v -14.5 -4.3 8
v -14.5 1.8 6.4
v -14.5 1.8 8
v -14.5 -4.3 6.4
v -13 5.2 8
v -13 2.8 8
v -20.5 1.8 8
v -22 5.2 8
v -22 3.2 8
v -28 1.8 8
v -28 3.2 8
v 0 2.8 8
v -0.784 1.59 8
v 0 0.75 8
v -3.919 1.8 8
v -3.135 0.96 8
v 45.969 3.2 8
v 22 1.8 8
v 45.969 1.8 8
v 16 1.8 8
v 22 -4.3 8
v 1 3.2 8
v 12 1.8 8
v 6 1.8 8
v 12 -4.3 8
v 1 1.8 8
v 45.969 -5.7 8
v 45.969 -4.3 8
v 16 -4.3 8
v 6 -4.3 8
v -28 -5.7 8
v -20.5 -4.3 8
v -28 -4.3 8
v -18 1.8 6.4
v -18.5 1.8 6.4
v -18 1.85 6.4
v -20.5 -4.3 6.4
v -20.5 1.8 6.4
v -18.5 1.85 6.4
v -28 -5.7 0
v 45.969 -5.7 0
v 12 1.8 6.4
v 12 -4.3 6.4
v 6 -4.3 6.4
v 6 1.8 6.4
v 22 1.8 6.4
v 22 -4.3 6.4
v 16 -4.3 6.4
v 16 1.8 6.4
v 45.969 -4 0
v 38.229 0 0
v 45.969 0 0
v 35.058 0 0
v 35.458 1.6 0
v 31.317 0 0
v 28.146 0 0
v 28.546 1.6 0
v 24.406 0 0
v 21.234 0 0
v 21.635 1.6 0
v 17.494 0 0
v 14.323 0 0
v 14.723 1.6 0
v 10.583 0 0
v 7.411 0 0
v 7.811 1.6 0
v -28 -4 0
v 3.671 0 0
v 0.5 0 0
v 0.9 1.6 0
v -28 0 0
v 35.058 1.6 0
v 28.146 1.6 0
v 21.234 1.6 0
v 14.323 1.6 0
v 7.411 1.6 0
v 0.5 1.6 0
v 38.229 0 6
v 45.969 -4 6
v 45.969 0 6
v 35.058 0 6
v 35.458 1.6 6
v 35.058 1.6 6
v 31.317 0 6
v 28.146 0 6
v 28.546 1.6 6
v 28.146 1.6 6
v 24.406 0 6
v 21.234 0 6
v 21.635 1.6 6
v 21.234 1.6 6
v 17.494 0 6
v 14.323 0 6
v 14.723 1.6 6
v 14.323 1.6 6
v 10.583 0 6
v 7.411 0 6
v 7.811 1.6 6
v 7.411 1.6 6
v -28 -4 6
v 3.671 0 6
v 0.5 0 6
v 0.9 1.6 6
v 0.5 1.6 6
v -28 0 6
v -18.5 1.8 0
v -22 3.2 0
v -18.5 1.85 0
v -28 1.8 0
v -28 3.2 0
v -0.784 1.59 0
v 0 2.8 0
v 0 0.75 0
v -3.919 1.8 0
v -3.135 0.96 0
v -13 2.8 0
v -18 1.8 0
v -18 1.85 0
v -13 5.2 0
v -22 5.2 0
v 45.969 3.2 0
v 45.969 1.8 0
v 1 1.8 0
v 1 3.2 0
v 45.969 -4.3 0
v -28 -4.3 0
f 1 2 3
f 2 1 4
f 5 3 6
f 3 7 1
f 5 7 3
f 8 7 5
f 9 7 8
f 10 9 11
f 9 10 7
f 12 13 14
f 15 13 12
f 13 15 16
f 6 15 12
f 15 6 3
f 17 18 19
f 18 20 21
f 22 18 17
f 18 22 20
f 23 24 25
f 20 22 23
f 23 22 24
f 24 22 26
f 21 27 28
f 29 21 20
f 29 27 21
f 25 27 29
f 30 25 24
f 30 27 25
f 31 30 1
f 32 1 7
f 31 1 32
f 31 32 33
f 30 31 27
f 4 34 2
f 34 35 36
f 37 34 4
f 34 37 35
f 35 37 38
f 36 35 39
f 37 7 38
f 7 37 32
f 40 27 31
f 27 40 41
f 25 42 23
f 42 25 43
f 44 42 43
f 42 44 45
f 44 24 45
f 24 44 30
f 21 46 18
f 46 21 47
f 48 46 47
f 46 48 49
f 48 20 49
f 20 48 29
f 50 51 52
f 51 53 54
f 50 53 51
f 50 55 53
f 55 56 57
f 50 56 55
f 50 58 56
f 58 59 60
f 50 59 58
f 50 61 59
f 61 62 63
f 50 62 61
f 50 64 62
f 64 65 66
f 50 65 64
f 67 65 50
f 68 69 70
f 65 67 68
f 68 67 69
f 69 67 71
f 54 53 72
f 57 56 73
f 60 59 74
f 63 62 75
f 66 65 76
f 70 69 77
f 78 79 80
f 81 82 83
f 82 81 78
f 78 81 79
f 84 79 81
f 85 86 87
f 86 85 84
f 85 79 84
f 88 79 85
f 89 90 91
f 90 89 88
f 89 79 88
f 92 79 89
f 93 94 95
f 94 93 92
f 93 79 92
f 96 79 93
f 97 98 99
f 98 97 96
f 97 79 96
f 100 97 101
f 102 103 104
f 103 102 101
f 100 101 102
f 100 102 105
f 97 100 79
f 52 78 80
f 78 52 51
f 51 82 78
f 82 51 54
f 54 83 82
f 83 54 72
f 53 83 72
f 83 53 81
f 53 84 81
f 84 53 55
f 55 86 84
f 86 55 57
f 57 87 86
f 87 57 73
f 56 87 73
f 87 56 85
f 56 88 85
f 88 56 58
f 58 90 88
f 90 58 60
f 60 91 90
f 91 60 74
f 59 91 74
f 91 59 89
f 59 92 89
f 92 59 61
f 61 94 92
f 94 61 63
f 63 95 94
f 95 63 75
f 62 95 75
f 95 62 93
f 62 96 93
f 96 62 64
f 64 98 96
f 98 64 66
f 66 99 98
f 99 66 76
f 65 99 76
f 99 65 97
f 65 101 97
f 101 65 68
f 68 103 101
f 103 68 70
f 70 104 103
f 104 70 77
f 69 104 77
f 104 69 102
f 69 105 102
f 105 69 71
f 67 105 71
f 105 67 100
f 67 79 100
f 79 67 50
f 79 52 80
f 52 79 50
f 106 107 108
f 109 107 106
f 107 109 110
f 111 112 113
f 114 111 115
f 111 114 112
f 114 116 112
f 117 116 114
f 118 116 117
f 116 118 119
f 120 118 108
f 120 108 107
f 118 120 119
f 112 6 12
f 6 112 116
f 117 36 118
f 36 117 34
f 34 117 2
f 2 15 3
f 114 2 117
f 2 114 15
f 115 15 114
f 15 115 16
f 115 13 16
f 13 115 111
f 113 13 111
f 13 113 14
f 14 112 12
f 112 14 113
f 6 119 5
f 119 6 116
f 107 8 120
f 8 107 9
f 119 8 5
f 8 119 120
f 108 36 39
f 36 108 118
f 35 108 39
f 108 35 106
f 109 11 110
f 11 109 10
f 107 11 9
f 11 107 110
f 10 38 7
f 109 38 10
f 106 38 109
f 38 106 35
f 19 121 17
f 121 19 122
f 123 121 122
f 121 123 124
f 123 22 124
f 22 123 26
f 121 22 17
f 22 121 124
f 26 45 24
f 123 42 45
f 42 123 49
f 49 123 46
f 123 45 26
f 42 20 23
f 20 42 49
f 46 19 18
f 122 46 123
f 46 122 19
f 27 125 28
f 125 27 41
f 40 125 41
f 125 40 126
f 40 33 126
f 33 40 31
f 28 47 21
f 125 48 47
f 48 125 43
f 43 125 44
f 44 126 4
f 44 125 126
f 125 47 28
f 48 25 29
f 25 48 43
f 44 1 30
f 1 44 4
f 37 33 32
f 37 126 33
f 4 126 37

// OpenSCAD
// file: ../pip-ratchet/pip-ratchet-coupon.scad
// pip-ratchet-coupon — print this first. One pawl (the production cross-section
// and profile, on the shared pawl_profile()) engaging a linear rack (the
// production tooth_profile() unrolled at the root circle), in a channel that
// confines the loose strip. Slide the rack +x (the arrow direction on the
// demonstrator): it should click and the pawl ride up each tooth; slide it −x:
// it must lock dead. No geometry is copied — the profiles come from the entry
// design, so what you tune here is what ships.
//
// WHAT TO TUNE: pawl_t, in 0.1 steps, via the sweep plate —
//   ./scripts/render.sh pip-ratchet --sweep pawl_t=0.9:1.5:0.1
// Stiffness (click force) scales ~ t³ and ride-up stress ~ t: thicker clicks
// harder and lives longer, thinner feels lighter. If the strip welds into the
// channel, open that gap by 0.05 and reprint: tooth tips to the near wall/pawl
// is web_clr (entry file, -D overridable), strip to the far rail is rail_gap
// (below). k_xy only sets the demonstrator's bore. See NOTES.md
// "Print this first". Overrides sit below the include (OpenSCAD resolves
// top-level variables last-assignment-wins); "coupon" has no dispatch branch,
// so the demonstrator itself renders nothing here.
include <pip-ratchet.scad>
part = "coupon";

/* [Coupon] */
// Teeth on the rack strip — enough clicks to judge the feel
coupon_teeth = 6;
// Rack strip body thickness below the root line (mm)
rack_body = 4;
// Rack strip height (mm) — the pawl keeps the production 8 mm section
rack_h = 6;
// Guide rail thickness (mm)
rail_t = 1.4;
// Far-rail sliding clearance (mm) — guidance only; the fit under test is the
// tooth-tip-to-wall web_clr, which is the production number
rail_gap = 0.3;
// Near rail resumes this far ahead of the nose face (mm)
nose_clear = 1;
// Joint offset (mm): keeps fixture faces that meet the pawl off its planes
joint_e = 0.05;

// ---- derived (linear unroll at the root circle) ------------------------
pitch_mm = tooth_pitch_arc();
x_w    = lock_gap;                // first tooth wall, lock_gap AHEAD (+x) of
                                   // the nose face — sliding −x drives the wall
                                   // onto the face (lock); +x presents ramps
x_rack0 = -block_back_u - 6;      // back margin reaches past the block zone
x_rack1 = x_w + coupon_teeth * pitch_mm + 4;
web_y  = web_in - r_root;         // beam underside plane = channel wall (1.8)
block_y_out = beam_out - r_root + 2.4;

function rack_pts() =
  let (teeth_pts = [ for (j = [0 : coupon_teeth - 1], p = tooth_profile())
                       [ x_w + j * pitch_mm + p[0], p[1] - r_root ] ])
  concat([[x_rack0, -rack_body], [x_rack0, 0]],
         teeth_pts,
         [[x_rack1, 0], [x_rack1, -rack_body]]);

function pawl_pts_linear() =
  [ for (p = pawl_profile()) [ -p[0], p[1] - r_root ] ];

module coupon() {
  assert(rack_h + z_tol < pawl_w, "bridge would sit above the pawl tops");
  assert(x_rack0 < -block_back_u - 2, "rack shorter than the pawl block zone");
  // the loose rack strip — slides in the channel, prints on the bed
  linear_extrude(rack_h) polygon(rack_pts());
  // the pawl, full production section, nose face at x = 0
  linear_extrude(pawl_w) polygon(pawl_pts_linear());
  // clamping block burying the pawl root (mirrors the demonstrator's sector).
  // Its underside sits joint_e ABOVE the pawl's underside plane: flush, the
  // two coincide with the rail's underside too, and the Manifold backend
  // unions three coplanar faces into a non-manifold seam (issue #668 CI).
  translate([-block_back_u, web_y + joint_e, 0])
    cube([block_back_u - block_front_u, block_y_out - web_y - joint_e, pawl_w]);
  // tooth-side channel wall, interrupted by the pawl: behind the block (its
  // end stops 0.5 mm short of the pawl's root face, INSIDE the block's x-span
  // — a tangent face-only contact leaves the fixture as two shells, and an
  // end flush on the pawl's underside is the same coplanar seam), and ahead of
  // the nose; between them the pawl's own underside is the wall
  translate([x_rack0, web_y, 0])
    cube([-(pawl_l + 0.5) - x_rack0, rail_t, pawl_w]);
  translate([nose_clear, web_y, 0])
    cube([x_rack1 - nose_clear, rail_t, pawl_w]);
  // far-side rail: the click reaction pushes the strip against this
  translate([x_rack0, -rack_body - rail_gap - rail_t, 0])
    cube([x_rack1 - x_rack0, rail_t, pawl_w]);
  // z-confinement bridges over the strip, 2 layers above it (z_tol) —
  // printed between the rails; they reach 0.2 mm INTO the near-rail band (or
  // the block, for the one behind the pawl) so every fixture joint is
  // volumetric, not face-tangent. The −20.5 bridge lands over the block's clamp
  // zone — frame-welds to frame, clear of the flexure (which starts at
  // x = −block_front_u = −13) — and is what ties the far-rail/ahead-rail group
  // to the pawl/block group, so the fixture is ONE body.
  // (−20.5, not −20: its faces stay off the pawl's 1 mm-spaced beam vertices)
  for (bx = [-20.5, 6, 16])
    translate([bx, -rack_body - rail_gap - rail_t, rack_h + z_tol])
      cube([6, web_y + rack_body + rail_gap + rail_t + 0.2,
            pawl_w - rack_h - z_tol]);
}

coupon();
// main file
// pip-ratchet-pla-coupon — print this first, IN PLA. The parent's coupon
// (a rack strip + one pawl on the shared production tooth/pawl profiles,
// nothing copied) with the beam re-sectioned for PLA: the single
// `pawl_t` override below mirrors pip-ratchet-pla.scad's #675 derivation —
// keep the two in sync (the wrapper cannot import the derivative's
// assignment without pasting the parent entry twice, which would
// double-draw; one mirrored constant is the smaller risk, and the sync is
// checked by eye against the echo in both files).
//
// WHAT TO TUNE / WHAT IT PROVES: in the parent this coupon only tunes feel
// (click force ~ t³); here it ALSO qualifies the material — PLA is ranked
// "unsuitable for a live flexure unless a coupon proves otherwise"
// (docs/advanced-techniques.md), so before printing the demonstrator you
// cycle this coupon to a click-count death and read the verdict against
// your target life (NOTES.md "Print this first", step 3). Breaking early
// is the coupon doing its job: it is the brief's "not viable" answer
// arriving before you spend the filament on the wheel.
//
// The sweep plate renders the neighbourhood if you want it:
//   ./scripts/render.sh pip-ratchet-pla --sweep pawl_t=0.9:1.5:0.1
include <../pip-ratchet/pip-ratchet-coupon.scad>
pawl_t = 1.0;   // the #675 PLA force-match, mirroring pip-ratchet-pla.scad
